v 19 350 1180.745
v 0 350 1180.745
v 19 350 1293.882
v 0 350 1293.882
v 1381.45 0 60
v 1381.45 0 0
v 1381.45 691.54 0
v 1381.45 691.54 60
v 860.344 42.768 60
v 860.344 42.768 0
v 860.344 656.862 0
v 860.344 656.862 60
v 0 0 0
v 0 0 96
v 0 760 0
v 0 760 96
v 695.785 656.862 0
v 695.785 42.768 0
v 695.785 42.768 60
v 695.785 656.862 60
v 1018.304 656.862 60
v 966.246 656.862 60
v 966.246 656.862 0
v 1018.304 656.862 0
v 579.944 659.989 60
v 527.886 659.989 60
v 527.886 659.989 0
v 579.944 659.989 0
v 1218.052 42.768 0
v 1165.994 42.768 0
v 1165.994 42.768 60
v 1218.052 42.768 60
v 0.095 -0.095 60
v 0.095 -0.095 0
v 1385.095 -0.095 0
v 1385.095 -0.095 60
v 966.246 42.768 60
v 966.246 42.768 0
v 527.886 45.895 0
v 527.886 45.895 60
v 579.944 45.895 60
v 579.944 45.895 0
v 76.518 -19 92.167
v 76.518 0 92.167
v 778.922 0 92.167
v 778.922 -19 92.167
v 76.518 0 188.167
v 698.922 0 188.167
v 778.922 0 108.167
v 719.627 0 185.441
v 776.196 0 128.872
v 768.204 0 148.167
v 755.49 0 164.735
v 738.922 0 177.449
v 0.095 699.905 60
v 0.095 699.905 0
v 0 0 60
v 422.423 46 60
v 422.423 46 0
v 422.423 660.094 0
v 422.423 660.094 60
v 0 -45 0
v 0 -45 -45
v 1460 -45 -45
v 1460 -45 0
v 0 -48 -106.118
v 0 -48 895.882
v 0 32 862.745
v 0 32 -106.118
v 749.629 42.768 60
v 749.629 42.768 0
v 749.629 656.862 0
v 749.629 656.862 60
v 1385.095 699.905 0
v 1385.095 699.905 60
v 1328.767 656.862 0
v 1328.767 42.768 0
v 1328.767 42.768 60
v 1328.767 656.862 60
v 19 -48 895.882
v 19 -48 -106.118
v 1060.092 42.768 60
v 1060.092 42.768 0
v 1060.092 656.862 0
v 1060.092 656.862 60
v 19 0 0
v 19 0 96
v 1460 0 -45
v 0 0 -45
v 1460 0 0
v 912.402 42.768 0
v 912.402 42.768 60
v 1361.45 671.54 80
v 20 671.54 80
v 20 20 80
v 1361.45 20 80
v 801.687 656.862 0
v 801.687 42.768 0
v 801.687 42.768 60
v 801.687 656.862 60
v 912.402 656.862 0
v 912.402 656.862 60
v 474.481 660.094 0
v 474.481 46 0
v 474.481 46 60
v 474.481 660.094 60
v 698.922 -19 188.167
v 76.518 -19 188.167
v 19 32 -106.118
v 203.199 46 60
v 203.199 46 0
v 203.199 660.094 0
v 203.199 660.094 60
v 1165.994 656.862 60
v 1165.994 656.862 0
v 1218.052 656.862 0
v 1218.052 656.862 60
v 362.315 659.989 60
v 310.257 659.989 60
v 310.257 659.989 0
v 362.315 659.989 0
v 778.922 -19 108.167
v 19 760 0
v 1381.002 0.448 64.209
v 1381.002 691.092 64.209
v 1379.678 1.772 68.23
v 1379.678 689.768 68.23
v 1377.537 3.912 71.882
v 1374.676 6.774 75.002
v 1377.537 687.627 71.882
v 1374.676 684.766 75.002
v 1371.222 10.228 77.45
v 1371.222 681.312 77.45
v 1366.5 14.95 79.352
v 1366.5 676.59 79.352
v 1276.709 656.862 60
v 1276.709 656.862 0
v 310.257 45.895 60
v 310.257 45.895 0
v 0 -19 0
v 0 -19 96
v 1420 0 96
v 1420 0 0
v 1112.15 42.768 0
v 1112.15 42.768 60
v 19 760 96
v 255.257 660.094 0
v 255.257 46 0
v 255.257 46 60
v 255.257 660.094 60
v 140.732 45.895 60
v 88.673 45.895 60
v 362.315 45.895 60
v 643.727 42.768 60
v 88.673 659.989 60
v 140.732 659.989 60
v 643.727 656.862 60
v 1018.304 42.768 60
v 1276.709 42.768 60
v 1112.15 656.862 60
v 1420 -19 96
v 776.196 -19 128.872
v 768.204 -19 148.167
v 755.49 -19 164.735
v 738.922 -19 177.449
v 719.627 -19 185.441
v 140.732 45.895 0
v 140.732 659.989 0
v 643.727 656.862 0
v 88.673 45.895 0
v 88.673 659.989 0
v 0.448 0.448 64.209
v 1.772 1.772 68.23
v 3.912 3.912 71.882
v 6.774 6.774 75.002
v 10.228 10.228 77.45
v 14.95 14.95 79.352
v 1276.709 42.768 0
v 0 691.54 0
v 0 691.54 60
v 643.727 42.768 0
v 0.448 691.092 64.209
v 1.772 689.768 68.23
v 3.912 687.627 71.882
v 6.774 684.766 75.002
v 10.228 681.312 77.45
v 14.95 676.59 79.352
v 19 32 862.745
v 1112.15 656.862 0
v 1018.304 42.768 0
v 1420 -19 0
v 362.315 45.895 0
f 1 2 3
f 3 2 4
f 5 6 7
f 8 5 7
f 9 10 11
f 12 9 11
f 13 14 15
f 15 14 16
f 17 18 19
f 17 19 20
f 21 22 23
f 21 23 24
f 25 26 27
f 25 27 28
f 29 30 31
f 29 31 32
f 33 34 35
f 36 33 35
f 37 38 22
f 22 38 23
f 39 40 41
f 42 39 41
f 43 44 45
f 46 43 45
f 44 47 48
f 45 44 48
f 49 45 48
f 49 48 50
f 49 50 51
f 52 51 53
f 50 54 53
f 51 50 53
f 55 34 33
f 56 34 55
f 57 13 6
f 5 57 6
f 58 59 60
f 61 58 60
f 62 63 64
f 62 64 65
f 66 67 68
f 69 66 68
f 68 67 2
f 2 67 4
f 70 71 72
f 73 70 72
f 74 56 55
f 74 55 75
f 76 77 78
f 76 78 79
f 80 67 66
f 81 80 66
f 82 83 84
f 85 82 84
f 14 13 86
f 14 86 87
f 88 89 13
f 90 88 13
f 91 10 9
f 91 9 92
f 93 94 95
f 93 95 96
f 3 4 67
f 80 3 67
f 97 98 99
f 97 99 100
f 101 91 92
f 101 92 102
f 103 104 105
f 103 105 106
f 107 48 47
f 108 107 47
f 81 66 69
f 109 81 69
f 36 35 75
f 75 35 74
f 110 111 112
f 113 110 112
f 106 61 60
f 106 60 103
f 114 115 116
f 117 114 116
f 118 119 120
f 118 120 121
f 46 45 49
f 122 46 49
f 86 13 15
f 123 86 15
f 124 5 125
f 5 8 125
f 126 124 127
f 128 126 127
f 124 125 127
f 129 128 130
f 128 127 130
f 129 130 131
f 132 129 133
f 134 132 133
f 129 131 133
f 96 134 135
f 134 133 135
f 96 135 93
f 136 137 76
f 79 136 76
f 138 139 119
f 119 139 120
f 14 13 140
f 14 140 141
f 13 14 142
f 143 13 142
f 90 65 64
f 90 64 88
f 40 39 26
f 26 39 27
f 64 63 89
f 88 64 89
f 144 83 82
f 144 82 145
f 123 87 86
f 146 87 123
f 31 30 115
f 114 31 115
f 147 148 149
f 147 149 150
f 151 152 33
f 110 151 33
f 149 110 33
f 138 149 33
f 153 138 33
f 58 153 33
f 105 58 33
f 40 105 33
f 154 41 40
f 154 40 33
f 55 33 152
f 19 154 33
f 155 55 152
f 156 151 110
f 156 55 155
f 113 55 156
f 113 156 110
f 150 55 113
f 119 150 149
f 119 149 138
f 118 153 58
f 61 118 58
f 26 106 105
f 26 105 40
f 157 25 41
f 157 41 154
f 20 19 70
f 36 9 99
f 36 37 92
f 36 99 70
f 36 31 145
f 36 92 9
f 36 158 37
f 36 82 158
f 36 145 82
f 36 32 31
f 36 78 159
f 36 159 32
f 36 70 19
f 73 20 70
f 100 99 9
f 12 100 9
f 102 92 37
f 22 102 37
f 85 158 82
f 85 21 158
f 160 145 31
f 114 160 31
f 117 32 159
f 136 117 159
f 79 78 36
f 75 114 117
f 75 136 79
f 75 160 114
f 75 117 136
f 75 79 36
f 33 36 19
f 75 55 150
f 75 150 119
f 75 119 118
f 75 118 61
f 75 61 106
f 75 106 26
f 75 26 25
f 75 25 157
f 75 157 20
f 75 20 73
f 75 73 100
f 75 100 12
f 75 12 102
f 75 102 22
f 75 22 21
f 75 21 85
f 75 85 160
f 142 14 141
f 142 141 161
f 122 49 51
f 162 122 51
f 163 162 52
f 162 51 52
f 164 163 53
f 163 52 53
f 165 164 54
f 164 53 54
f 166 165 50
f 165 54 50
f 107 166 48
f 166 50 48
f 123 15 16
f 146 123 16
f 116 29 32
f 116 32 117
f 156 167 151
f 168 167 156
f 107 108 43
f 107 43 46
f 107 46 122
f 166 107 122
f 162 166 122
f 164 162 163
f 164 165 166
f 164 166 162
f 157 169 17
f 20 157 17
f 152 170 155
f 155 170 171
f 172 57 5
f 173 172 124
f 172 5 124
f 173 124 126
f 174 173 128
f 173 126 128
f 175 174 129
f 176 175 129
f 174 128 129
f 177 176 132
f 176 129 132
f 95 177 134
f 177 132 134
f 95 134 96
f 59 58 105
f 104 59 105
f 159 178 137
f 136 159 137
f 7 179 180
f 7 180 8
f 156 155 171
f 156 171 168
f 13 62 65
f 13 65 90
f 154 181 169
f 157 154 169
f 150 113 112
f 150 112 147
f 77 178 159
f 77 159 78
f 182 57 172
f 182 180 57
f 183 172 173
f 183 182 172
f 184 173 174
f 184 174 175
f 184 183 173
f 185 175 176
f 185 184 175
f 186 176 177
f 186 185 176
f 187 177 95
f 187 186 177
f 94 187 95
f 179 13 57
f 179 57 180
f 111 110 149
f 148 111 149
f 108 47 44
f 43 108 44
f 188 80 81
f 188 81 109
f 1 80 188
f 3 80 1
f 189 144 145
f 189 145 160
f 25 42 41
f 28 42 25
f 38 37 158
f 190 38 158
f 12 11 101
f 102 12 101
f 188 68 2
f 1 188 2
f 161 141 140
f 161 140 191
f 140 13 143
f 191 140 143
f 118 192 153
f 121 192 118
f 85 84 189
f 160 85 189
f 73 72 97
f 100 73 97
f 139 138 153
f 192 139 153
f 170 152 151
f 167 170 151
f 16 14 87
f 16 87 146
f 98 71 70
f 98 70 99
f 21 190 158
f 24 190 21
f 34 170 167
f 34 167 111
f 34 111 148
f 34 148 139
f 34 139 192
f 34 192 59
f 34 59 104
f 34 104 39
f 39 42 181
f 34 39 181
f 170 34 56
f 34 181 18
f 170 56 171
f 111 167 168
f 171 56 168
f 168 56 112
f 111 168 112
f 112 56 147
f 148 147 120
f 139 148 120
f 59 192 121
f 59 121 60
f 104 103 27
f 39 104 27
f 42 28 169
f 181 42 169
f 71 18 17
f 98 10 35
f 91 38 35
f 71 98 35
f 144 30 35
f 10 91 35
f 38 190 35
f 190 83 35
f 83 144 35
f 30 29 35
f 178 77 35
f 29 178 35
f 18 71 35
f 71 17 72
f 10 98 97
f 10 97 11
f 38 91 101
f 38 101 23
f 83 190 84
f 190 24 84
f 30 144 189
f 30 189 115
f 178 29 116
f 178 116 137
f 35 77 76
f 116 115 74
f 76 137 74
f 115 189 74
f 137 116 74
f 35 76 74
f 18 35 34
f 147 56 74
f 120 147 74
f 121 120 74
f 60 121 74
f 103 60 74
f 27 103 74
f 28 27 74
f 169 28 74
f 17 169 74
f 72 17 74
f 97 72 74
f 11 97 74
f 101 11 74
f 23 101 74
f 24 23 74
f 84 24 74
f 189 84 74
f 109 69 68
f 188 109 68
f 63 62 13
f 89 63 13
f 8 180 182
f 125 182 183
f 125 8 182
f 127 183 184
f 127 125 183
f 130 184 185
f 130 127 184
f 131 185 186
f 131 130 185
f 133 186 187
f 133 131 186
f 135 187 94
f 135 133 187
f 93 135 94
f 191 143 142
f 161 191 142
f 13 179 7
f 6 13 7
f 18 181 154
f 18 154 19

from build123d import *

# Parameters (mm, degrees)
F0_W      = 1385
F0_H      = 700
F0_W_2    = 52.058242
F0_H_2    = 614.094056
F0_W_3    = 52.058243
F0_H_3    = 614.094057
F1_DEPTH  = 60
F3_W      = 32
F3_H      = 106.117774
F4_DEPTH  = 19
F5_W      = 760
F5_H      = 96
F6_DEPTH  = 19
F7_W      = 1420
F7_H      = 96
F8_DEPTH  = 19
F9_W      = 45
F9_H      = 45
F10_DEPTH = 1460
F12_DEPTH = 19
F13_W     = 1381.449699
F13_H     = 691.539764
F14_DEPTH = 80
F15_R     = 20


with BuildPart() as f1:
    # F0 (on Top) → F1 (new body)
    with BuildSketch(Plane.XY):
        with Locations((692.5948, 349.905201)):
            Rectangle(F0_W, F0_H)
        with Locations((669.756066, 349.815305)):
            Rectangle(F0_W_2, F0_H_2, mode=Mode.SUBTRACT)
        with Locations((775.658131, 349.815309)):
            Rectangle(F0_W_2, F0_H_2, mode=Mode.SUBTRACT)
        with Locations((886.372935, 349.815328)):
            Rectangle(F0_W_2, F0_H_2, mode=Mode.SUBTRACT)
        with Locations((992.274999, 349.815331)):
            Rectangle(F0_W_3, F0_H_2, mode=Mode.SUBTRACT)
        with Locations((1086.121028, 349.81532)):
            Rectangle(F0_W_2, F0_H_2, mode=Mode.SUBTRACT)
        with Locations((1192.023093, 349.815324)):
            Rectangle(F0_W_2, F0_H_2, mode=Mode.SUBTRACT)
        with Locations((1302.737897, 349.815342)):
            Rectangle(F0_W_2, F0_H_3, mode=Mode.SUBTRACT)
        with Locations((114.702497, 352.942329)):
            Rectangle(F0_W_2, F0_H_2, mode=Mode.SUBTRACT)
        with Locations((229.227826, 353.047132)):
            Rectangle(F0_W_2, F0_H_3, mode=Mode.SUBTRACT)
        with Locations((336.286019, 352.942329)):
            Rectangle(F0_W_3, F0_H_2, mode=Mode.SUBTRACT)
        with Locations((448.451858, 353.047132)):
            Rectangle(F0_W_2, F0_H_3, mode=Mode.SUBTRACT)
        with Locations((553.914975, 352.942329)):
            Rectangle(F0_W_3, F0_H_2, mode=Mode.SUBTRACT)
    extrude(amount=F1_DEPTH)


with BuildPart() as f4:
    # F3 (on Right) → F4 (new body)
    with BuildSketch(Plane.YZ):
        Polygon((0, -106.117774), (0, 0), (32, 0), (32, 862.745141), (350, 1180.745141), (350, 1293.882226), (-48, 895.882226), (-48, -106.117774), (-29, -106.117774), (-10, -106.117774), align=None)
        with Locations((16, -53.058887)):
            Rectangle(F3_W, F3_H)
    extrude(amount=F4_DEPTH)


with BuildPart() as f6:
    # F5 (on Right) → F6 (new body)
    with BuildSketch(Plane.YZ):
        with Locations((380, 48)):
            Rectangle(F5_W, F5_H)
    extrude(amount=F6_DEPTH)


with BuildPart() as f8:
    # F7 (on Front) → F8 (new body)
    with BuildSketch(Plane.XZ):
        with Locations((710, 48)):
            Rectangle(F7_W, F7_H)
    extrude(amount=F8_DEPTH)


with BuildPart() as f10:
    # F9 (on Right) → F10 (new body)
    with BuildSketch(Plane.YZ):
        with Locations((-22.5, -22.5)):
            Rectangle(F9_W, F9_H)
    extrude(amount=F10_DEPTH)


with BuildPart() as f12:
    # F11 (on Front) → F12 (new body)
    with BuildSketch(Plane.XZ):
        with BuildLine():
            Line((698.921861, 188.166573), (76.518134, 188.166573))
            Line((76.518134, 188.166573), (76.518134, 92.166573))
            Line((76.518134, 92.166573), (778.921861, 92.166573))
            Line((778.921861, 92.166573), (778.921861, 108.166573))
            ThreePointArc((778.921861, 108.166573), (755.490404, 164.735116), (698.921861, 188.166573))
        make_face()
    extrude(amount=F12_DEPTH)


with BuildPart() as f14:
    # F13 (on Top) → F14 (new body)
    with BuildSketch(Plane.XY):
        with Locations((690.72485, 345.769882)):
            Rectangle(F13_W, F13_H)
    extrude(amount=F14_DEPTH)

    # F15
    f15_edges = [f14.edges().sort_by_distance(p)[0] for p in [
        (0, 345.769882, 80),
        (690.72485, 0, 80),
        (1381.449699, 345.769882, 80),
        (690.72485, 691.539764, 80),
    ]]
    fillet(f15_edges, radius=F15_R)


solid = Compound([f1.part, f4.part, f6.part, f8.part, f10.part, f12.part, f14.part])
